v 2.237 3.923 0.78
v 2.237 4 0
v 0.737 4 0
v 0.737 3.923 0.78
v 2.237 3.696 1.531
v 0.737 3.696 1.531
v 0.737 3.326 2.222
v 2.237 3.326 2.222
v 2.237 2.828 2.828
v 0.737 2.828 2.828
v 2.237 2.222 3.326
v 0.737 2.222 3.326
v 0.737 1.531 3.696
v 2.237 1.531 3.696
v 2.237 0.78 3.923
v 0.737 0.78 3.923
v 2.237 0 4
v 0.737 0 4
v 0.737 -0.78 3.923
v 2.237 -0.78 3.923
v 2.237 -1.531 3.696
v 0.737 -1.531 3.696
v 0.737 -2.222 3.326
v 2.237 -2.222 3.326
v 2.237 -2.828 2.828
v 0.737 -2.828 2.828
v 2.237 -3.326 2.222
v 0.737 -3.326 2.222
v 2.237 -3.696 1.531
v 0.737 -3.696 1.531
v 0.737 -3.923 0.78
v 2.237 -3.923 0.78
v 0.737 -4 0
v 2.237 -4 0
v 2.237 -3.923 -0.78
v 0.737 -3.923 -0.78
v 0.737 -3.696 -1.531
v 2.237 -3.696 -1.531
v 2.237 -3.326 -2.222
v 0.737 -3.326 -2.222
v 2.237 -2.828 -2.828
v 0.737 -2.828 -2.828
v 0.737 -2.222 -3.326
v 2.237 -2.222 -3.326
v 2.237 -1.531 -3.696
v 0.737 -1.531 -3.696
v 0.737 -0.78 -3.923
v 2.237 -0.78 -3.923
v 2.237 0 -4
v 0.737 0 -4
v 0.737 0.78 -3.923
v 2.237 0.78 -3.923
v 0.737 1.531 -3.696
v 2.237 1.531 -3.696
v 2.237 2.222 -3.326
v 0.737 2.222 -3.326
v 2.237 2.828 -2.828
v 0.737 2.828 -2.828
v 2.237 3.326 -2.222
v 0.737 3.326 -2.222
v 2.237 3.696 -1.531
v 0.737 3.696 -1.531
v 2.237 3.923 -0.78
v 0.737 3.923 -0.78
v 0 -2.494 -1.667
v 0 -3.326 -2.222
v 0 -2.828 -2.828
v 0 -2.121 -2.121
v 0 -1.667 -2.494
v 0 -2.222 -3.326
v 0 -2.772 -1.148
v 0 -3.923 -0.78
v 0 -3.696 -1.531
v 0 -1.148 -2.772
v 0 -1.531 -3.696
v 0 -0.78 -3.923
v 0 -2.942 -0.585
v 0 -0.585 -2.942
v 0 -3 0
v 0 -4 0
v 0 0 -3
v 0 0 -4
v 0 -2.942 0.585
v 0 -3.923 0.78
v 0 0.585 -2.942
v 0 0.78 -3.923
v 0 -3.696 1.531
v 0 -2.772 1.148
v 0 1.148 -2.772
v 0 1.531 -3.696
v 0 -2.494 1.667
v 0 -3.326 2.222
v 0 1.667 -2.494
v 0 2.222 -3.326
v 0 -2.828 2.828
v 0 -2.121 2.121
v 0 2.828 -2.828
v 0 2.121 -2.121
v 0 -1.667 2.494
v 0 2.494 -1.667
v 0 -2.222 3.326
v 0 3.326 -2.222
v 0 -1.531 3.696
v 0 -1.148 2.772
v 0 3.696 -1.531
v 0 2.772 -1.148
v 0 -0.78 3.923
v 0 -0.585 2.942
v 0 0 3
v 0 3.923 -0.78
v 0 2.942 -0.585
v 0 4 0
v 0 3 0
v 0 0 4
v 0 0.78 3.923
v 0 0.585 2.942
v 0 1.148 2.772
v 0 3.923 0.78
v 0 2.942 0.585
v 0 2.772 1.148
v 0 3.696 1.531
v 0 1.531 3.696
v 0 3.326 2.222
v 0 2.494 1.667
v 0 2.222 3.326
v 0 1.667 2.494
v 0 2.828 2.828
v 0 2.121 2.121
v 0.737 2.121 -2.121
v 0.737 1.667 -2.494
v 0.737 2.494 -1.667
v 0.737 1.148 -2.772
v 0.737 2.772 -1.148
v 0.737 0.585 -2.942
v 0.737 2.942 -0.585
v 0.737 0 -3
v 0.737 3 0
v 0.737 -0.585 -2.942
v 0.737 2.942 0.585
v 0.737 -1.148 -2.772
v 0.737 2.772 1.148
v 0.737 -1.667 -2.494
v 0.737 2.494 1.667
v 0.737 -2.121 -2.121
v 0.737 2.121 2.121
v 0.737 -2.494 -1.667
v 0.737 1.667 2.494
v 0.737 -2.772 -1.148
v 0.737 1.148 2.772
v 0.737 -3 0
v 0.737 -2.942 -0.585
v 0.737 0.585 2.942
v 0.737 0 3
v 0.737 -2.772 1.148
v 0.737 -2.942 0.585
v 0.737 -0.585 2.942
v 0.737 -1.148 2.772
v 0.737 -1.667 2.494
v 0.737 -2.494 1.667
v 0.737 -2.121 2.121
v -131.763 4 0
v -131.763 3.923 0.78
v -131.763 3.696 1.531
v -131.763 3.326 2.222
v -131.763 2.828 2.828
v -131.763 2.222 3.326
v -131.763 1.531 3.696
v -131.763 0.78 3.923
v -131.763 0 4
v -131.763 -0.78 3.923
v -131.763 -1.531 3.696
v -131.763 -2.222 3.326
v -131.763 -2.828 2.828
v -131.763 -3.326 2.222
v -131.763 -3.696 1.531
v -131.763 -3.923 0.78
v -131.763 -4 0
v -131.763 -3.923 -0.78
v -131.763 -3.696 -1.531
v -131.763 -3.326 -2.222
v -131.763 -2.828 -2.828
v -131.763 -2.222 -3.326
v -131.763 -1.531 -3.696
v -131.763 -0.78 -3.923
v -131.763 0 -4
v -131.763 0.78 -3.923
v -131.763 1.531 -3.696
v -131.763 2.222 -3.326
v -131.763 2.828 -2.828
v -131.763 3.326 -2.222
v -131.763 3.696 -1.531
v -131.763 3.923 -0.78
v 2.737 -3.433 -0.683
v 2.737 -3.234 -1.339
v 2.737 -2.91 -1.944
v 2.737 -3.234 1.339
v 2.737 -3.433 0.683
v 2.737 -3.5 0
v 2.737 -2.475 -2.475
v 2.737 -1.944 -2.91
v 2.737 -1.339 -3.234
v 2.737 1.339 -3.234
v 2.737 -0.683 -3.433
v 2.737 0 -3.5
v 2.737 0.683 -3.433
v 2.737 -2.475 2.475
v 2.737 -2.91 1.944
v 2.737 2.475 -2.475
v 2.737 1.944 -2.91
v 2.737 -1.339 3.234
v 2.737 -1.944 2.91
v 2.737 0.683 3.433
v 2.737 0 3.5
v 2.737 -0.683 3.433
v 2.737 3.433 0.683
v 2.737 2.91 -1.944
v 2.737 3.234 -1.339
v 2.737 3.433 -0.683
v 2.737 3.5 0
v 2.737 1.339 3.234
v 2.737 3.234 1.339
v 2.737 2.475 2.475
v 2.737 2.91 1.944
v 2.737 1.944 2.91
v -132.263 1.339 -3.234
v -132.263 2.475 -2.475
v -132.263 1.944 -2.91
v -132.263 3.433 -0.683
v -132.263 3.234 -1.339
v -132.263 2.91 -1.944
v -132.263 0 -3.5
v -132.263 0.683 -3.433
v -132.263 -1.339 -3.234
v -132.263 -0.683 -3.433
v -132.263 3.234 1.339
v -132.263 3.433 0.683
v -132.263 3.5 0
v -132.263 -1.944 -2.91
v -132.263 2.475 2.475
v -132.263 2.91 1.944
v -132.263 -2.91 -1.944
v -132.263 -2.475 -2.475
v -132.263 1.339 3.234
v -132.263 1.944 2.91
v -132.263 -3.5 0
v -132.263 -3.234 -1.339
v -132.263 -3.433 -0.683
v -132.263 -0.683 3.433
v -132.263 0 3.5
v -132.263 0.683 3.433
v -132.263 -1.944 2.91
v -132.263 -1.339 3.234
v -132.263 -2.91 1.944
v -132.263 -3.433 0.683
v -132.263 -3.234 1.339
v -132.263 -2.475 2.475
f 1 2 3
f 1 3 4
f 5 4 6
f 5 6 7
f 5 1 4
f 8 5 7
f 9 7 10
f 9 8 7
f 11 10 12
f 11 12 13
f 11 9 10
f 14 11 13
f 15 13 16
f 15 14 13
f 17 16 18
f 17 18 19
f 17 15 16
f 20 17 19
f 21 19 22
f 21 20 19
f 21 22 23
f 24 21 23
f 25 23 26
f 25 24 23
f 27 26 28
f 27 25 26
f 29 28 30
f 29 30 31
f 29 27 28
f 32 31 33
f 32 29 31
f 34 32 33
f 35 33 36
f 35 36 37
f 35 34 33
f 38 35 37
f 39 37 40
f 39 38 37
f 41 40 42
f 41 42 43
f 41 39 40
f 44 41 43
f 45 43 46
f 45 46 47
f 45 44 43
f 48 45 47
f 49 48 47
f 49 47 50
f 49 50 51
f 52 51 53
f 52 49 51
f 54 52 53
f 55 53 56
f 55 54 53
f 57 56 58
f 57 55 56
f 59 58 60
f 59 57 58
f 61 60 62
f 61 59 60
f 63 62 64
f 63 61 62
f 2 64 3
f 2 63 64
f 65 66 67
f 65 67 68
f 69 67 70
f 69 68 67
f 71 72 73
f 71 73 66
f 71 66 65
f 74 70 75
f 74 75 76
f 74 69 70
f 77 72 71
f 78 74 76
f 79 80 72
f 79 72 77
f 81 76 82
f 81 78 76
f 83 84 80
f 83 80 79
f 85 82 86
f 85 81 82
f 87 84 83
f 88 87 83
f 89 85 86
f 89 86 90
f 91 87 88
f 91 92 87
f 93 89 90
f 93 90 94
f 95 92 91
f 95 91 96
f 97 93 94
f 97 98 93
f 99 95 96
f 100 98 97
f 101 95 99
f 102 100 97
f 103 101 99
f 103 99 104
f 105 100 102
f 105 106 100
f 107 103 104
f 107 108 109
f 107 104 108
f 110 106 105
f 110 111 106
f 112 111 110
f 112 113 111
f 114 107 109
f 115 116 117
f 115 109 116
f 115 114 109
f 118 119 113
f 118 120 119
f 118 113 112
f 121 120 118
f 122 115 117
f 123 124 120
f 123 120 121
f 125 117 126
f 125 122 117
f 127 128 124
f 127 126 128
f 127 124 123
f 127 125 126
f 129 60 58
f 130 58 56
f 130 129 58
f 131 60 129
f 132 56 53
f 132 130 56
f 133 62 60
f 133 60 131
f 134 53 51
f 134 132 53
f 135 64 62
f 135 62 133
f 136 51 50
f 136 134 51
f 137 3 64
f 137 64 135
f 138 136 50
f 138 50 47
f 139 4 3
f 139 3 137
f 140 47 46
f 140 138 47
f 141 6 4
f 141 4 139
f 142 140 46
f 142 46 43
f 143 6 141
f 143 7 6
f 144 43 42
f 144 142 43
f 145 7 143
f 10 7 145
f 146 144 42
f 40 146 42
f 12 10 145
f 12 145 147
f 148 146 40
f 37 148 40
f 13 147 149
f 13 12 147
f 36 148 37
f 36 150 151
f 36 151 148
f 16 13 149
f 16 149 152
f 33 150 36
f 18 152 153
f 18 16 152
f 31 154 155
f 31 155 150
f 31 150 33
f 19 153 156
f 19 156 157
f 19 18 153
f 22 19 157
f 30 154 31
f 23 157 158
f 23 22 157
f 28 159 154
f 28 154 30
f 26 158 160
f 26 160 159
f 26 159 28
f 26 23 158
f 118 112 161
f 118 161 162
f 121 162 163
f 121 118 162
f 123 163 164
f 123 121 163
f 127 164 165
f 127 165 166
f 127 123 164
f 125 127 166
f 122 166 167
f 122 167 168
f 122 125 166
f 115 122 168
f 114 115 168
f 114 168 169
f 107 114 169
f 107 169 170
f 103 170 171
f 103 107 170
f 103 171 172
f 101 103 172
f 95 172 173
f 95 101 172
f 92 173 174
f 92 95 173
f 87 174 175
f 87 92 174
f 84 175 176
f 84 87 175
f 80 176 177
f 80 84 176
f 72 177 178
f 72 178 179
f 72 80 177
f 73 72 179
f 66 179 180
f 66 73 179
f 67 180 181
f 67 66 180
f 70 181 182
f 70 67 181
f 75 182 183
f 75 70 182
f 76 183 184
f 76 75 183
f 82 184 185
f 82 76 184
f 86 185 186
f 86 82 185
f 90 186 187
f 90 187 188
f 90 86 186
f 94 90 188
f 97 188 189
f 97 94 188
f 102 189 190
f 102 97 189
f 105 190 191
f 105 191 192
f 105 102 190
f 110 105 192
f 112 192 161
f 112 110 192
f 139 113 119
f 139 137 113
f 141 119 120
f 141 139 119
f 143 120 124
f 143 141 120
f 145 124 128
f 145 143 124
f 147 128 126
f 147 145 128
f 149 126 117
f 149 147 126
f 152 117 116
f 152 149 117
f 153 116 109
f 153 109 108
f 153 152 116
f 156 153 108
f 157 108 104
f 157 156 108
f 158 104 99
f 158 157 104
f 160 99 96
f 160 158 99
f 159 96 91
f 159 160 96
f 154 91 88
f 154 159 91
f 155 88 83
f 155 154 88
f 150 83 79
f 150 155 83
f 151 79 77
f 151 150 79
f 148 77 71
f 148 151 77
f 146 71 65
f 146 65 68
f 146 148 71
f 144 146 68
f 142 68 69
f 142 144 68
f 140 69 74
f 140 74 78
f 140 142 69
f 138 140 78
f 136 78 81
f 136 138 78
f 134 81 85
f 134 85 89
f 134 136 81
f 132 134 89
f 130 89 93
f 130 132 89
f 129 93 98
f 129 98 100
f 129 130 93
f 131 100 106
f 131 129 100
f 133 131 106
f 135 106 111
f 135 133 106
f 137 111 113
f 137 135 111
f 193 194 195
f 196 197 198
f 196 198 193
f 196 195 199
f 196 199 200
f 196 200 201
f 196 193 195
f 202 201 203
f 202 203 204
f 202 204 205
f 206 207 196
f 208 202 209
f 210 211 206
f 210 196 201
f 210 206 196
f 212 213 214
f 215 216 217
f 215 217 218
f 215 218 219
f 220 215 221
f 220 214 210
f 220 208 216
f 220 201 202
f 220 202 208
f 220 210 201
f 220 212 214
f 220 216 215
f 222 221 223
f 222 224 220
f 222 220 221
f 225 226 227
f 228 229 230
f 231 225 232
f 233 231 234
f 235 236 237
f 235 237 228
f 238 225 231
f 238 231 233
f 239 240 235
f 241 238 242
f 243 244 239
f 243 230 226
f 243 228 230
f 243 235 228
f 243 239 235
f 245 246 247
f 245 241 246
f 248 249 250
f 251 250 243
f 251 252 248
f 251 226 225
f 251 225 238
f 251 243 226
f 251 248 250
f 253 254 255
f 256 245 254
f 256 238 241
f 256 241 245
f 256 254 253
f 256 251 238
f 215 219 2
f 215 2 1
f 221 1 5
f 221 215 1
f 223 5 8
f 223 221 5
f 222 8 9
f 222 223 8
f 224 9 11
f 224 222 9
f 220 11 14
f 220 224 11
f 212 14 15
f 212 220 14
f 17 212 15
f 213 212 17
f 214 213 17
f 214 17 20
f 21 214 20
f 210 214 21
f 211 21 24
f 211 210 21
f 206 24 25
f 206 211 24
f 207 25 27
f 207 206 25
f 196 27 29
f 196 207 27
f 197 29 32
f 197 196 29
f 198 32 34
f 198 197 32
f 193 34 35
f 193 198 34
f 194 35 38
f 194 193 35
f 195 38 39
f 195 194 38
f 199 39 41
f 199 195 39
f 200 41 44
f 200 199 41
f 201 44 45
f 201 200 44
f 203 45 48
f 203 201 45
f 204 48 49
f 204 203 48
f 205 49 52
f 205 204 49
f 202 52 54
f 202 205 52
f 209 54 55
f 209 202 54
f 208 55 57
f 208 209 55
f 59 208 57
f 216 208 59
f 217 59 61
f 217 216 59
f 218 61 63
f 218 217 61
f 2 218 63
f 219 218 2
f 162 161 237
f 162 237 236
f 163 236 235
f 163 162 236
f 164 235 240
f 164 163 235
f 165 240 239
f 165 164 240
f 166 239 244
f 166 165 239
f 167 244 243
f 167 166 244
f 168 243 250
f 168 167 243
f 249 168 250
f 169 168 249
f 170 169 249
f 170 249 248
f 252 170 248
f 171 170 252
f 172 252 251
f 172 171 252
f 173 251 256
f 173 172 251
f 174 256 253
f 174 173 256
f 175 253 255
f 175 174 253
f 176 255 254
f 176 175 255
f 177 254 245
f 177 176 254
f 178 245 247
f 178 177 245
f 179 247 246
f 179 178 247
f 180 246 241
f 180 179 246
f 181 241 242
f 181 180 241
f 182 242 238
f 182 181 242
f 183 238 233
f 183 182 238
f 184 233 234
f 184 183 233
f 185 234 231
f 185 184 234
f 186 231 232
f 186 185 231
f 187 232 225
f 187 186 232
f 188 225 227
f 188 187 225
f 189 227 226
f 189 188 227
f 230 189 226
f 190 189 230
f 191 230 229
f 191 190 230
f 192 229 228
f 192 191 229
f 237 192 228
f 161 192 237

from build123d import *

# Parameters (mm, degrees)
CHAMFER1_SIZE = 0.5


with BuildPart() as part:
    # Sketch1 → Revolve1 (revolve)
    with BuildSketch(Plane.XY):
        Polygon((0.7366, 4), (2.7366, 4), (2.7366, 0), (-132.2634, 0), (-132.2634, 4), (0, 4), (0, 3), (0.7366, 3), align=None)
    revolve(axis=Axis((2.7366, 0, 0), (1, 0, 0)))

    # Chamfer1
    chamfer1_edges = [part.edges().sort_by_distance(p)[0] for p in [
        (2.7366, -4, 0),
        (-132.2634, -4, 0),
    ]]
    chamfer(chamfer1_edges, length=CHAMFER1_SIZE)


solid = part.part
